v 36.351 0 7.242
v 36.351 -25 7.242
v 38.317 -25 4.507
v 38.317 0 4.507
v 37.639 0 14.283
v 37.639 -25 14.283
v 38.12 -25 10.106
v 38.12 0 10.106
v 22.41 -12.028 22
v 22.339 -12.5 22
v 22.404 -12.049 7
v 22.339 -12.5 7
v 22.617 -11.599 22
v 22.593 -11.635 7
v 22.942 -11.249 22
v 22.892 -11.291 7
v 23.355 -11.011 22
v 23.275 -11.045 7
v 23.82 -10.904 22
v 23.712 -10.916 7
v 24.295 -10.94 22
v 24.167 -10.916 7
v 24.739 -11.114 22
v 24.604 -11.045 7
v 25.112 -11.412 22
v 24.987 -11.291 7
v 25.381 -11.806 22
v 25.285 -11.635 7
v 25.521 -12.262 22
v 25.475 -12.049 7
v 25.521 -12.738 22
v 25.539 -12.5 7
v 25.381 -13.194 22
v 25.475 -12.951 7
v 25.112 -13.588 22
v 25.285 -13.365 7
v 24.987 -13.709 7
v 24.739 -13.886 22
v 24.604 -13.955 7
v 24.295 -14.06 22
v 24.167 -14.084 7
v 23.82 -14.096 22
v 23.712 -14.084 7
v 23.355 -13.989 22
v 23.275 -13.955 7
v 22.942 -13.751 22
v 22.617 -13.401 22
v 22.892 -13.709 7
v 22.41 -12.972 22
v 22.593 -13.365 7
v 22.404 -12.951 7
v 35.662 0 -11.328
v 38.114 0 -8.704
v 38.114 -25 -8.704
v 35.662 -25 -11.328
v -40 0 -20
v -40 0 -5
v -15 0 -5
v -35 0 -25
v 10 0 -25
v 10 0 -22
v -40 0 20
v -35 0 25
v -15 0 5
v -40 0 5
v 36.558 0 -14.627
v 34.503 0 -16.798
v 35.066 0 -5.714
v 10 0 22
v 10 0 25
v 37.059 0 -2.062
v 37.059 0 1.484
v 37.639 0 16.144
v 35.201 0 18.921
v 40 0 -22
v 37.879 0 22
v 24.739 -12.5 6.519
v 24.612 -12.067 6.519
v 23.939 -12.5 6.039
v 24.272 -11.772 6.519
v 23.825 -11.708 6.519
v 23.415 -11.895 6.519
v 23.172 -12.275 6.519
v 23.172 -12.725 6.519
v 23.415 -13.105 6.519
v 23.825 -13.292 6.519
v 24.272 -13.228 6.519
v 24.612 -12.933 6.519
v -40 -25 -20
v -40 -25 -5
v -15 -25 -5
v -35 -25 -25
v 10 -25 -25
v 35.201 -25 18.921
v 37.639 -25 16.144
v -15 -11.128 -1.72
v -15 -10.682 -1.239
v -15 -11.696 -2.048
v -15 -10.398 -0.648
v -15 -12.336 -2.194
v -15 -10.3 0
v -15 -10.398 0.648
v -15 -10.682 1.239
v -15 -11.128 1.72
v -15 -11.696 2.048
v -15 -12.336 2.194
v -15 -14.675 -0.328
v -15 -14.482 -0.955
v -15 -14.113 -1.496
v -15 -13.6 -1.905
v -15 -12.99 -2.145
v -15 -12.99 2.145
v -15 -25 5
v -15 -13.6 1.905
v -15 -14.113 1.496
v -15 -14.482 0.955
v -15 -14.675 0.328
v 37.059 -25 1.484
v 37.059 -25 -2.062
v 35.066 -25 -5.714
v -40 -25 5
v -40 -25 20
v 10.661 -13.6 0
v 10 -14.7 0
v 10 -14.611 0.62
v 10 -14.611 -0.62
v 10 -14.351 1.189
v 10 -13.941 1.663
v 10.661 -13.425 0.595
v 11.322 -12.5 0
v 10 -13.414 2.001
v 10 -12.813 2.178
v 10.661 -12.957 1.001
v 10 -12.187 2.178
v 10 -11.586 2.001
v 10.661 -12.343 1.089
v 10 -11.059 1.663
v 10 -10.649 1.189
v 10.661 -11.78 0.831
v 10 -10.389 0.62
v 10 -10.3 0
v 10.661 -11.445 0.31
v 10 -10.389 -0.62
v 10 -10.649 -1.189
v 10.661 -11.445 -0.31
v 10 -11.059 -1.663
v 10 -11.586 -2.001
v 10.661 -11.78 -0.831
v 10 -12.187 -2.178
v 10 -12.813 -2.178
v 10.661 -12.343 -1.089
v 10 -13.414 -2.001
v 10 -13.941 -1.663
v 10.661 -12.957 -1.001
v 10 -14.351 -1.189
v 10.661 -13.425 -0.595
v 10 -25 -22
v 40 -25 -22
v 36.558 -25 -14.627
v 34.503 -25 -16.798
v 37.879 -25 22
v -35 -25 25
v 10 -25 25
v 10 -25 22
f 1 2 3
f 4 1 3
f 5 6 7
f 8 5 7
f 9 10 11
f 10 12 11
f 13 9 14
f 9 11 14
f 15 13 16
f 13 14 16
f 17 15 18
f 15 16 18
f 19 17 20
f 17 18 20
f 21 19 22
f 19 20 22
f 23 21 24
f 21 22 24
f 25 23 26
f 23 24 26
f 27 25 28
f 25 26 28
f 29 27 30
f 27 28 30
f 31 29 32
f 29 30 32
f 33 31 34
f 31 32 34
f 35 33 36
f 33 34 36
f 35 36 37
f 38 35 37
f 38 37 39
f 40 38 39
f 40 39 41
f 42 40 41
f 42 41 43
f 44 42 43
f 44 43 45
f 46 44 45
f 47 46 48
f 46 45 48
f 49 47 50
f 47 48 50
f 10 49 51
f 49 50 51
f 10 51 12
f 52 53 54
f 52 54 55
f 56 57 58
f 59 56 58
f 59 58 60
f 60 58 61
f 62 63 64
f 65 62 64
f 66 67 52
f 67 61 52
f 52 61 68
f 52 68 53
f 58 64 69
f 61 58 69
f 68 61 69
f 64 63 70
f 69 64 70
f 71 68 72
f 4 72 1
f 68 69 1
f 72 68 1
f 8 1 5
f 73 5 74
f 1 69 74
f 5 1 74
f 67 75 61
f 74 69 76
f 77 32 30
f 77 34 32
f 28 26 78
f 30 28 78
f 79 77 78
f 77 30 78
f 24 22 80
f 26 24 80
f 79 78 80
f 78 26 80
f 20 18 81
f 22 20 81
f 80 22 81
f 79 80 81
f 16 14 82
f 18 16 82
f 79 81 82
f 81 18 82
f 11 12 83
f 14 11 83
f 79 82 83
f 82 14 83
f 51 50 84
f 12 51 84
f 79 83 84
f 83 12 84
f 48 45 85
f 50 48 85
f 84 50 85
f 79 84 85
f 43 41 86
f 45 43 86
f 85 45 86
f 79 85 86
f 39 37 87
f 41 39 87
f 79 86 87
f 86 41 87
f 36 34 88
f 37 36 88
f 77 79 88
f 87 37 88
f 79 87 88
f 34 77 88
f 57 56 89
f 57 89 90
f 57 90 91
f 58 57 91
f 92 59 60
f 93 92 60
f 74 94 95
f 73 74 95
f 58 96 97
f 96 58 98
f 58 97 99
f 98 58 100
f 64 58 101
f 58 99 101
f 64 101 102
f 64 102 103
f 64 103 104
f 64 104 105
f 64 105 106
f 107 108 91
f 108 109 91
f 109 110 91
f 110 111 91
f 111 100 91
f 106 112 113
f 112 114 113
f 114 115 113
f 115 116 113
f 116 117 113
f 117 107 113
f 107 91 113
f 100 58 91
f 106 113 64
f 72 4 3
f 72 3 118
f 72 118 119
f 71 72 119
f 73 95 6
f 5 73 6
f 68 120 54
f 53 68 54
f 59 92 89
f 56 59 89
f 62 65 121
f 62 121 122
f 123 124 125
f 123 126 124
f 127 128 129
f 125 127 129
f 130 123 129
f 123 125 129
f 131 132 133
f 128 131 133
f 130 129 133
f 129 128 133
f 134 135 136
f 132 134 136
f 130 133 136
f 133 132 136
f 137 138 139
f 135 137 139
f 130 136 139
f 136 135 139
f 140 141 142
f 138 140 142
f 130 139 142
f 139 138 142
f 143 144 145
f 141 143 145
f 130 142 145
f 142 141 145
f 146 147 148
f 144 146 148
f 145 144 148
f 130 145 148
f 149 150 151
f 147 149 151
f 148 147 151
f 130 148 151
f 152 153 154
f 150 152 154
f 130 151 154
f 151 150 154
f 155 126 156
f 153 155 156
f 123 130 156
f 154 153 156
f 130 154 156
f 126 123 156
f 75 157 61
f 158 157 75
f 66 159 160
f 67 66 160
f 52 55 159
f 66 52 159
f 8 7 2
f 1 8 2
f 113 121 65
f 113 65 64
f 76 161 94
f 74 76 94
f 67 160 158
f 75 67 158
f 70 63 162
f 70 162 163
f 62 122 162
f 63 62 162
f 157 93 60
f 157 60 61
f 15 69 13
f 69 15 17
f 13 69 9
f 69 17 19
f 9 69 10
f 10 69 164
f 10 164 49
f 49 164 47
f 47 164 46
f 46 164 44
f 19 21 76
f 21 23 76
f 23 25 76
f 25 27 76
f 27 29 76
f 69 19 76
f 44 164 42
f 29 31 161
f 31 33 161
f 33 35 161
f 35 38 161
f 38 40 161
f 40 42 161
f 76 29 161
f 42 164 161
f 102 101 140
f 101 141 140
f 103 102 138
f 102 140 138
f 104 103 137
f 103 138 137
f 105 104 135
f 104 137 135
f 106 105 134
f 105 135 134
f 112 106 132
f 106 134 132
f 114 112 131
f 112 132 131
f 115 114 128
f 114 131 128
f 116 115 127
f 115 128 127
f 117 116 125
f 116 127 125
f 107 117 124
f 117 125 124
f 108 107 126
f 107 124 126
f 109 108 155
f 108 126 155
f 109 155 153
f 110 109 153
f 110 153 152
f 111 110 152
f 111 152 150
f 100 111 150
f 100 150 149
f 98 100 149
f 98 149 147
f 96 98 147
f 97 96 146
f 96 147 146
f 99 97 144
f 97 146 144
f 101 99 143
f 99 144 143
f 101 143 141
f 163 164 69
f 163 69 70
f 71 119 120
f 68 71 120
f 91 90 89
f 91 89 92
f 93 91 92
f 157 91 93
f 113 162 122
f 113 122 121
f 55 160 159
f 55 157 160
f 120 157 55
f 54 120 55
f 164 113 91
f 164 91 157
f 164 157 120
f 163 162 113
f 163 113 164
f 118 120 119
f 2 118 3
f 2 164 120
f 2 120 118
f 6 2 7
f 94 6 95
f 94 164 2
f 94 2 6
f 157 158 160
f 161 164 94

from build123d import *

# Parameters (mm, degrees)
F0_W      = 80
F0_H      = 50
F1_DEPTH  = 25
F3_DEPTH  = 25
F4_W      = 25
F4_H      = 10
F5_DEPTH  = 25
F7_D      = 4.4
F7_DEPTH  = 25
F7_TIP    = 1.3218933619
F8_W      = 30
F8_H      = 3
F9_DEPTH  = 25
F11_DEPTH = 25
F13_D     = 3.2
F13_DEPTH = 15
F13_TIP   = 0.9613769904


with BuildPart() as f1:
    # F0 (on Front) → F1 (new body)
    with BuildSketch(Plane.XZ):
        Rectangle(F0_W, F0_H)
    extrude(amount=F1_DEPTH)

    # F2 (on face) → F3 (cut)
    with BuildSketch(Plane.XZ.offset(25)):
        Polygon((-35, -25), (-40, -20), (-40, -25), align=None)
        Polygon((-40, 20), (-35, 25), (-40, 25), align=None)
    extrude(amount=-F3_DEPTH, mode=Mode.SUBTRACT)

    # F4 (on face) → F5 (cut)
    with BuildSketch(Plane.XZ.offset(25)):
        with Locations((-27.5, 0)):
            Rectangle(F4_W, F4_H)
    extrude(amount=-F5_DEPTH, mode=Mode.SUBTRACT)

    # F7
    with Locations(Plane(origin=(-15, 0, 0), x_dir=(0, -1, 0), z_dir=(-1, 0, 0))):
        with Locations((12.5, 0)):
            Hole(F7_D / 2, depth=F7_DEPTH)
            with Locations((0, 0, -(F7_DEPTH + F7_TIP / 2))):  # 118° drill point
                Cone(0, F7_D / 2, F7_TIP, mode=Mode.SUBTRACT)

    # F8 (on face) → F9 (cut)
    with BuildSketch(Plane.XZ.offset(25)):
        with Locations((25, -23.5)):
            Rectangle(F8_W, F8_H)
        with Locations((25, 23.5)):
            Rectangle(F8_W, F8_H)
    extrude(amount=-F9_DEPTH, mode=Mode.SUBTRACT)

    # F10 (on face) → F11 (cut)
    with BuildSketch(Plane.XZ.offset(25)):
        Polygon((34.5029532909, -16.7983844876), (40, -22), (40, 22), (37.8786325455, 22), (35.2007597685, 18.9214255661), (37.6393385231, 16.1444209516), (37.6393385231, 14.2828542739), (38.1201058626, 10.1062655449), (36.3511256874, 7.2423182428), (38.3169800043, 4.507265985), (37.0589233935, 1.4836080372), (37.0589233935, -2.0621158183), (35.0656695664, -5.7143010199), (38.1139032543, -8.7043344975), (35.661585629, -11.3277509809), (36.5576688207, -14.626969239), align=None)
    extrude(amount=-F11_DEPTH, mode=Mode.SUBTRACT)

    # F13
    with Locations(Plane.XY.offset(22)):
        with Locations((23.9393162727, -12.5)):
            Hole(F13_D / 2, depth=F13_DEPTH)
            with Locations((0, 0, -(F13_DEPTH + F13_TIP / 2))):  # 118° drill point
                Cone(0, F13_D / 2, F13_TIP, mode=Mode.SUBTRACT)


solid = f1.part
